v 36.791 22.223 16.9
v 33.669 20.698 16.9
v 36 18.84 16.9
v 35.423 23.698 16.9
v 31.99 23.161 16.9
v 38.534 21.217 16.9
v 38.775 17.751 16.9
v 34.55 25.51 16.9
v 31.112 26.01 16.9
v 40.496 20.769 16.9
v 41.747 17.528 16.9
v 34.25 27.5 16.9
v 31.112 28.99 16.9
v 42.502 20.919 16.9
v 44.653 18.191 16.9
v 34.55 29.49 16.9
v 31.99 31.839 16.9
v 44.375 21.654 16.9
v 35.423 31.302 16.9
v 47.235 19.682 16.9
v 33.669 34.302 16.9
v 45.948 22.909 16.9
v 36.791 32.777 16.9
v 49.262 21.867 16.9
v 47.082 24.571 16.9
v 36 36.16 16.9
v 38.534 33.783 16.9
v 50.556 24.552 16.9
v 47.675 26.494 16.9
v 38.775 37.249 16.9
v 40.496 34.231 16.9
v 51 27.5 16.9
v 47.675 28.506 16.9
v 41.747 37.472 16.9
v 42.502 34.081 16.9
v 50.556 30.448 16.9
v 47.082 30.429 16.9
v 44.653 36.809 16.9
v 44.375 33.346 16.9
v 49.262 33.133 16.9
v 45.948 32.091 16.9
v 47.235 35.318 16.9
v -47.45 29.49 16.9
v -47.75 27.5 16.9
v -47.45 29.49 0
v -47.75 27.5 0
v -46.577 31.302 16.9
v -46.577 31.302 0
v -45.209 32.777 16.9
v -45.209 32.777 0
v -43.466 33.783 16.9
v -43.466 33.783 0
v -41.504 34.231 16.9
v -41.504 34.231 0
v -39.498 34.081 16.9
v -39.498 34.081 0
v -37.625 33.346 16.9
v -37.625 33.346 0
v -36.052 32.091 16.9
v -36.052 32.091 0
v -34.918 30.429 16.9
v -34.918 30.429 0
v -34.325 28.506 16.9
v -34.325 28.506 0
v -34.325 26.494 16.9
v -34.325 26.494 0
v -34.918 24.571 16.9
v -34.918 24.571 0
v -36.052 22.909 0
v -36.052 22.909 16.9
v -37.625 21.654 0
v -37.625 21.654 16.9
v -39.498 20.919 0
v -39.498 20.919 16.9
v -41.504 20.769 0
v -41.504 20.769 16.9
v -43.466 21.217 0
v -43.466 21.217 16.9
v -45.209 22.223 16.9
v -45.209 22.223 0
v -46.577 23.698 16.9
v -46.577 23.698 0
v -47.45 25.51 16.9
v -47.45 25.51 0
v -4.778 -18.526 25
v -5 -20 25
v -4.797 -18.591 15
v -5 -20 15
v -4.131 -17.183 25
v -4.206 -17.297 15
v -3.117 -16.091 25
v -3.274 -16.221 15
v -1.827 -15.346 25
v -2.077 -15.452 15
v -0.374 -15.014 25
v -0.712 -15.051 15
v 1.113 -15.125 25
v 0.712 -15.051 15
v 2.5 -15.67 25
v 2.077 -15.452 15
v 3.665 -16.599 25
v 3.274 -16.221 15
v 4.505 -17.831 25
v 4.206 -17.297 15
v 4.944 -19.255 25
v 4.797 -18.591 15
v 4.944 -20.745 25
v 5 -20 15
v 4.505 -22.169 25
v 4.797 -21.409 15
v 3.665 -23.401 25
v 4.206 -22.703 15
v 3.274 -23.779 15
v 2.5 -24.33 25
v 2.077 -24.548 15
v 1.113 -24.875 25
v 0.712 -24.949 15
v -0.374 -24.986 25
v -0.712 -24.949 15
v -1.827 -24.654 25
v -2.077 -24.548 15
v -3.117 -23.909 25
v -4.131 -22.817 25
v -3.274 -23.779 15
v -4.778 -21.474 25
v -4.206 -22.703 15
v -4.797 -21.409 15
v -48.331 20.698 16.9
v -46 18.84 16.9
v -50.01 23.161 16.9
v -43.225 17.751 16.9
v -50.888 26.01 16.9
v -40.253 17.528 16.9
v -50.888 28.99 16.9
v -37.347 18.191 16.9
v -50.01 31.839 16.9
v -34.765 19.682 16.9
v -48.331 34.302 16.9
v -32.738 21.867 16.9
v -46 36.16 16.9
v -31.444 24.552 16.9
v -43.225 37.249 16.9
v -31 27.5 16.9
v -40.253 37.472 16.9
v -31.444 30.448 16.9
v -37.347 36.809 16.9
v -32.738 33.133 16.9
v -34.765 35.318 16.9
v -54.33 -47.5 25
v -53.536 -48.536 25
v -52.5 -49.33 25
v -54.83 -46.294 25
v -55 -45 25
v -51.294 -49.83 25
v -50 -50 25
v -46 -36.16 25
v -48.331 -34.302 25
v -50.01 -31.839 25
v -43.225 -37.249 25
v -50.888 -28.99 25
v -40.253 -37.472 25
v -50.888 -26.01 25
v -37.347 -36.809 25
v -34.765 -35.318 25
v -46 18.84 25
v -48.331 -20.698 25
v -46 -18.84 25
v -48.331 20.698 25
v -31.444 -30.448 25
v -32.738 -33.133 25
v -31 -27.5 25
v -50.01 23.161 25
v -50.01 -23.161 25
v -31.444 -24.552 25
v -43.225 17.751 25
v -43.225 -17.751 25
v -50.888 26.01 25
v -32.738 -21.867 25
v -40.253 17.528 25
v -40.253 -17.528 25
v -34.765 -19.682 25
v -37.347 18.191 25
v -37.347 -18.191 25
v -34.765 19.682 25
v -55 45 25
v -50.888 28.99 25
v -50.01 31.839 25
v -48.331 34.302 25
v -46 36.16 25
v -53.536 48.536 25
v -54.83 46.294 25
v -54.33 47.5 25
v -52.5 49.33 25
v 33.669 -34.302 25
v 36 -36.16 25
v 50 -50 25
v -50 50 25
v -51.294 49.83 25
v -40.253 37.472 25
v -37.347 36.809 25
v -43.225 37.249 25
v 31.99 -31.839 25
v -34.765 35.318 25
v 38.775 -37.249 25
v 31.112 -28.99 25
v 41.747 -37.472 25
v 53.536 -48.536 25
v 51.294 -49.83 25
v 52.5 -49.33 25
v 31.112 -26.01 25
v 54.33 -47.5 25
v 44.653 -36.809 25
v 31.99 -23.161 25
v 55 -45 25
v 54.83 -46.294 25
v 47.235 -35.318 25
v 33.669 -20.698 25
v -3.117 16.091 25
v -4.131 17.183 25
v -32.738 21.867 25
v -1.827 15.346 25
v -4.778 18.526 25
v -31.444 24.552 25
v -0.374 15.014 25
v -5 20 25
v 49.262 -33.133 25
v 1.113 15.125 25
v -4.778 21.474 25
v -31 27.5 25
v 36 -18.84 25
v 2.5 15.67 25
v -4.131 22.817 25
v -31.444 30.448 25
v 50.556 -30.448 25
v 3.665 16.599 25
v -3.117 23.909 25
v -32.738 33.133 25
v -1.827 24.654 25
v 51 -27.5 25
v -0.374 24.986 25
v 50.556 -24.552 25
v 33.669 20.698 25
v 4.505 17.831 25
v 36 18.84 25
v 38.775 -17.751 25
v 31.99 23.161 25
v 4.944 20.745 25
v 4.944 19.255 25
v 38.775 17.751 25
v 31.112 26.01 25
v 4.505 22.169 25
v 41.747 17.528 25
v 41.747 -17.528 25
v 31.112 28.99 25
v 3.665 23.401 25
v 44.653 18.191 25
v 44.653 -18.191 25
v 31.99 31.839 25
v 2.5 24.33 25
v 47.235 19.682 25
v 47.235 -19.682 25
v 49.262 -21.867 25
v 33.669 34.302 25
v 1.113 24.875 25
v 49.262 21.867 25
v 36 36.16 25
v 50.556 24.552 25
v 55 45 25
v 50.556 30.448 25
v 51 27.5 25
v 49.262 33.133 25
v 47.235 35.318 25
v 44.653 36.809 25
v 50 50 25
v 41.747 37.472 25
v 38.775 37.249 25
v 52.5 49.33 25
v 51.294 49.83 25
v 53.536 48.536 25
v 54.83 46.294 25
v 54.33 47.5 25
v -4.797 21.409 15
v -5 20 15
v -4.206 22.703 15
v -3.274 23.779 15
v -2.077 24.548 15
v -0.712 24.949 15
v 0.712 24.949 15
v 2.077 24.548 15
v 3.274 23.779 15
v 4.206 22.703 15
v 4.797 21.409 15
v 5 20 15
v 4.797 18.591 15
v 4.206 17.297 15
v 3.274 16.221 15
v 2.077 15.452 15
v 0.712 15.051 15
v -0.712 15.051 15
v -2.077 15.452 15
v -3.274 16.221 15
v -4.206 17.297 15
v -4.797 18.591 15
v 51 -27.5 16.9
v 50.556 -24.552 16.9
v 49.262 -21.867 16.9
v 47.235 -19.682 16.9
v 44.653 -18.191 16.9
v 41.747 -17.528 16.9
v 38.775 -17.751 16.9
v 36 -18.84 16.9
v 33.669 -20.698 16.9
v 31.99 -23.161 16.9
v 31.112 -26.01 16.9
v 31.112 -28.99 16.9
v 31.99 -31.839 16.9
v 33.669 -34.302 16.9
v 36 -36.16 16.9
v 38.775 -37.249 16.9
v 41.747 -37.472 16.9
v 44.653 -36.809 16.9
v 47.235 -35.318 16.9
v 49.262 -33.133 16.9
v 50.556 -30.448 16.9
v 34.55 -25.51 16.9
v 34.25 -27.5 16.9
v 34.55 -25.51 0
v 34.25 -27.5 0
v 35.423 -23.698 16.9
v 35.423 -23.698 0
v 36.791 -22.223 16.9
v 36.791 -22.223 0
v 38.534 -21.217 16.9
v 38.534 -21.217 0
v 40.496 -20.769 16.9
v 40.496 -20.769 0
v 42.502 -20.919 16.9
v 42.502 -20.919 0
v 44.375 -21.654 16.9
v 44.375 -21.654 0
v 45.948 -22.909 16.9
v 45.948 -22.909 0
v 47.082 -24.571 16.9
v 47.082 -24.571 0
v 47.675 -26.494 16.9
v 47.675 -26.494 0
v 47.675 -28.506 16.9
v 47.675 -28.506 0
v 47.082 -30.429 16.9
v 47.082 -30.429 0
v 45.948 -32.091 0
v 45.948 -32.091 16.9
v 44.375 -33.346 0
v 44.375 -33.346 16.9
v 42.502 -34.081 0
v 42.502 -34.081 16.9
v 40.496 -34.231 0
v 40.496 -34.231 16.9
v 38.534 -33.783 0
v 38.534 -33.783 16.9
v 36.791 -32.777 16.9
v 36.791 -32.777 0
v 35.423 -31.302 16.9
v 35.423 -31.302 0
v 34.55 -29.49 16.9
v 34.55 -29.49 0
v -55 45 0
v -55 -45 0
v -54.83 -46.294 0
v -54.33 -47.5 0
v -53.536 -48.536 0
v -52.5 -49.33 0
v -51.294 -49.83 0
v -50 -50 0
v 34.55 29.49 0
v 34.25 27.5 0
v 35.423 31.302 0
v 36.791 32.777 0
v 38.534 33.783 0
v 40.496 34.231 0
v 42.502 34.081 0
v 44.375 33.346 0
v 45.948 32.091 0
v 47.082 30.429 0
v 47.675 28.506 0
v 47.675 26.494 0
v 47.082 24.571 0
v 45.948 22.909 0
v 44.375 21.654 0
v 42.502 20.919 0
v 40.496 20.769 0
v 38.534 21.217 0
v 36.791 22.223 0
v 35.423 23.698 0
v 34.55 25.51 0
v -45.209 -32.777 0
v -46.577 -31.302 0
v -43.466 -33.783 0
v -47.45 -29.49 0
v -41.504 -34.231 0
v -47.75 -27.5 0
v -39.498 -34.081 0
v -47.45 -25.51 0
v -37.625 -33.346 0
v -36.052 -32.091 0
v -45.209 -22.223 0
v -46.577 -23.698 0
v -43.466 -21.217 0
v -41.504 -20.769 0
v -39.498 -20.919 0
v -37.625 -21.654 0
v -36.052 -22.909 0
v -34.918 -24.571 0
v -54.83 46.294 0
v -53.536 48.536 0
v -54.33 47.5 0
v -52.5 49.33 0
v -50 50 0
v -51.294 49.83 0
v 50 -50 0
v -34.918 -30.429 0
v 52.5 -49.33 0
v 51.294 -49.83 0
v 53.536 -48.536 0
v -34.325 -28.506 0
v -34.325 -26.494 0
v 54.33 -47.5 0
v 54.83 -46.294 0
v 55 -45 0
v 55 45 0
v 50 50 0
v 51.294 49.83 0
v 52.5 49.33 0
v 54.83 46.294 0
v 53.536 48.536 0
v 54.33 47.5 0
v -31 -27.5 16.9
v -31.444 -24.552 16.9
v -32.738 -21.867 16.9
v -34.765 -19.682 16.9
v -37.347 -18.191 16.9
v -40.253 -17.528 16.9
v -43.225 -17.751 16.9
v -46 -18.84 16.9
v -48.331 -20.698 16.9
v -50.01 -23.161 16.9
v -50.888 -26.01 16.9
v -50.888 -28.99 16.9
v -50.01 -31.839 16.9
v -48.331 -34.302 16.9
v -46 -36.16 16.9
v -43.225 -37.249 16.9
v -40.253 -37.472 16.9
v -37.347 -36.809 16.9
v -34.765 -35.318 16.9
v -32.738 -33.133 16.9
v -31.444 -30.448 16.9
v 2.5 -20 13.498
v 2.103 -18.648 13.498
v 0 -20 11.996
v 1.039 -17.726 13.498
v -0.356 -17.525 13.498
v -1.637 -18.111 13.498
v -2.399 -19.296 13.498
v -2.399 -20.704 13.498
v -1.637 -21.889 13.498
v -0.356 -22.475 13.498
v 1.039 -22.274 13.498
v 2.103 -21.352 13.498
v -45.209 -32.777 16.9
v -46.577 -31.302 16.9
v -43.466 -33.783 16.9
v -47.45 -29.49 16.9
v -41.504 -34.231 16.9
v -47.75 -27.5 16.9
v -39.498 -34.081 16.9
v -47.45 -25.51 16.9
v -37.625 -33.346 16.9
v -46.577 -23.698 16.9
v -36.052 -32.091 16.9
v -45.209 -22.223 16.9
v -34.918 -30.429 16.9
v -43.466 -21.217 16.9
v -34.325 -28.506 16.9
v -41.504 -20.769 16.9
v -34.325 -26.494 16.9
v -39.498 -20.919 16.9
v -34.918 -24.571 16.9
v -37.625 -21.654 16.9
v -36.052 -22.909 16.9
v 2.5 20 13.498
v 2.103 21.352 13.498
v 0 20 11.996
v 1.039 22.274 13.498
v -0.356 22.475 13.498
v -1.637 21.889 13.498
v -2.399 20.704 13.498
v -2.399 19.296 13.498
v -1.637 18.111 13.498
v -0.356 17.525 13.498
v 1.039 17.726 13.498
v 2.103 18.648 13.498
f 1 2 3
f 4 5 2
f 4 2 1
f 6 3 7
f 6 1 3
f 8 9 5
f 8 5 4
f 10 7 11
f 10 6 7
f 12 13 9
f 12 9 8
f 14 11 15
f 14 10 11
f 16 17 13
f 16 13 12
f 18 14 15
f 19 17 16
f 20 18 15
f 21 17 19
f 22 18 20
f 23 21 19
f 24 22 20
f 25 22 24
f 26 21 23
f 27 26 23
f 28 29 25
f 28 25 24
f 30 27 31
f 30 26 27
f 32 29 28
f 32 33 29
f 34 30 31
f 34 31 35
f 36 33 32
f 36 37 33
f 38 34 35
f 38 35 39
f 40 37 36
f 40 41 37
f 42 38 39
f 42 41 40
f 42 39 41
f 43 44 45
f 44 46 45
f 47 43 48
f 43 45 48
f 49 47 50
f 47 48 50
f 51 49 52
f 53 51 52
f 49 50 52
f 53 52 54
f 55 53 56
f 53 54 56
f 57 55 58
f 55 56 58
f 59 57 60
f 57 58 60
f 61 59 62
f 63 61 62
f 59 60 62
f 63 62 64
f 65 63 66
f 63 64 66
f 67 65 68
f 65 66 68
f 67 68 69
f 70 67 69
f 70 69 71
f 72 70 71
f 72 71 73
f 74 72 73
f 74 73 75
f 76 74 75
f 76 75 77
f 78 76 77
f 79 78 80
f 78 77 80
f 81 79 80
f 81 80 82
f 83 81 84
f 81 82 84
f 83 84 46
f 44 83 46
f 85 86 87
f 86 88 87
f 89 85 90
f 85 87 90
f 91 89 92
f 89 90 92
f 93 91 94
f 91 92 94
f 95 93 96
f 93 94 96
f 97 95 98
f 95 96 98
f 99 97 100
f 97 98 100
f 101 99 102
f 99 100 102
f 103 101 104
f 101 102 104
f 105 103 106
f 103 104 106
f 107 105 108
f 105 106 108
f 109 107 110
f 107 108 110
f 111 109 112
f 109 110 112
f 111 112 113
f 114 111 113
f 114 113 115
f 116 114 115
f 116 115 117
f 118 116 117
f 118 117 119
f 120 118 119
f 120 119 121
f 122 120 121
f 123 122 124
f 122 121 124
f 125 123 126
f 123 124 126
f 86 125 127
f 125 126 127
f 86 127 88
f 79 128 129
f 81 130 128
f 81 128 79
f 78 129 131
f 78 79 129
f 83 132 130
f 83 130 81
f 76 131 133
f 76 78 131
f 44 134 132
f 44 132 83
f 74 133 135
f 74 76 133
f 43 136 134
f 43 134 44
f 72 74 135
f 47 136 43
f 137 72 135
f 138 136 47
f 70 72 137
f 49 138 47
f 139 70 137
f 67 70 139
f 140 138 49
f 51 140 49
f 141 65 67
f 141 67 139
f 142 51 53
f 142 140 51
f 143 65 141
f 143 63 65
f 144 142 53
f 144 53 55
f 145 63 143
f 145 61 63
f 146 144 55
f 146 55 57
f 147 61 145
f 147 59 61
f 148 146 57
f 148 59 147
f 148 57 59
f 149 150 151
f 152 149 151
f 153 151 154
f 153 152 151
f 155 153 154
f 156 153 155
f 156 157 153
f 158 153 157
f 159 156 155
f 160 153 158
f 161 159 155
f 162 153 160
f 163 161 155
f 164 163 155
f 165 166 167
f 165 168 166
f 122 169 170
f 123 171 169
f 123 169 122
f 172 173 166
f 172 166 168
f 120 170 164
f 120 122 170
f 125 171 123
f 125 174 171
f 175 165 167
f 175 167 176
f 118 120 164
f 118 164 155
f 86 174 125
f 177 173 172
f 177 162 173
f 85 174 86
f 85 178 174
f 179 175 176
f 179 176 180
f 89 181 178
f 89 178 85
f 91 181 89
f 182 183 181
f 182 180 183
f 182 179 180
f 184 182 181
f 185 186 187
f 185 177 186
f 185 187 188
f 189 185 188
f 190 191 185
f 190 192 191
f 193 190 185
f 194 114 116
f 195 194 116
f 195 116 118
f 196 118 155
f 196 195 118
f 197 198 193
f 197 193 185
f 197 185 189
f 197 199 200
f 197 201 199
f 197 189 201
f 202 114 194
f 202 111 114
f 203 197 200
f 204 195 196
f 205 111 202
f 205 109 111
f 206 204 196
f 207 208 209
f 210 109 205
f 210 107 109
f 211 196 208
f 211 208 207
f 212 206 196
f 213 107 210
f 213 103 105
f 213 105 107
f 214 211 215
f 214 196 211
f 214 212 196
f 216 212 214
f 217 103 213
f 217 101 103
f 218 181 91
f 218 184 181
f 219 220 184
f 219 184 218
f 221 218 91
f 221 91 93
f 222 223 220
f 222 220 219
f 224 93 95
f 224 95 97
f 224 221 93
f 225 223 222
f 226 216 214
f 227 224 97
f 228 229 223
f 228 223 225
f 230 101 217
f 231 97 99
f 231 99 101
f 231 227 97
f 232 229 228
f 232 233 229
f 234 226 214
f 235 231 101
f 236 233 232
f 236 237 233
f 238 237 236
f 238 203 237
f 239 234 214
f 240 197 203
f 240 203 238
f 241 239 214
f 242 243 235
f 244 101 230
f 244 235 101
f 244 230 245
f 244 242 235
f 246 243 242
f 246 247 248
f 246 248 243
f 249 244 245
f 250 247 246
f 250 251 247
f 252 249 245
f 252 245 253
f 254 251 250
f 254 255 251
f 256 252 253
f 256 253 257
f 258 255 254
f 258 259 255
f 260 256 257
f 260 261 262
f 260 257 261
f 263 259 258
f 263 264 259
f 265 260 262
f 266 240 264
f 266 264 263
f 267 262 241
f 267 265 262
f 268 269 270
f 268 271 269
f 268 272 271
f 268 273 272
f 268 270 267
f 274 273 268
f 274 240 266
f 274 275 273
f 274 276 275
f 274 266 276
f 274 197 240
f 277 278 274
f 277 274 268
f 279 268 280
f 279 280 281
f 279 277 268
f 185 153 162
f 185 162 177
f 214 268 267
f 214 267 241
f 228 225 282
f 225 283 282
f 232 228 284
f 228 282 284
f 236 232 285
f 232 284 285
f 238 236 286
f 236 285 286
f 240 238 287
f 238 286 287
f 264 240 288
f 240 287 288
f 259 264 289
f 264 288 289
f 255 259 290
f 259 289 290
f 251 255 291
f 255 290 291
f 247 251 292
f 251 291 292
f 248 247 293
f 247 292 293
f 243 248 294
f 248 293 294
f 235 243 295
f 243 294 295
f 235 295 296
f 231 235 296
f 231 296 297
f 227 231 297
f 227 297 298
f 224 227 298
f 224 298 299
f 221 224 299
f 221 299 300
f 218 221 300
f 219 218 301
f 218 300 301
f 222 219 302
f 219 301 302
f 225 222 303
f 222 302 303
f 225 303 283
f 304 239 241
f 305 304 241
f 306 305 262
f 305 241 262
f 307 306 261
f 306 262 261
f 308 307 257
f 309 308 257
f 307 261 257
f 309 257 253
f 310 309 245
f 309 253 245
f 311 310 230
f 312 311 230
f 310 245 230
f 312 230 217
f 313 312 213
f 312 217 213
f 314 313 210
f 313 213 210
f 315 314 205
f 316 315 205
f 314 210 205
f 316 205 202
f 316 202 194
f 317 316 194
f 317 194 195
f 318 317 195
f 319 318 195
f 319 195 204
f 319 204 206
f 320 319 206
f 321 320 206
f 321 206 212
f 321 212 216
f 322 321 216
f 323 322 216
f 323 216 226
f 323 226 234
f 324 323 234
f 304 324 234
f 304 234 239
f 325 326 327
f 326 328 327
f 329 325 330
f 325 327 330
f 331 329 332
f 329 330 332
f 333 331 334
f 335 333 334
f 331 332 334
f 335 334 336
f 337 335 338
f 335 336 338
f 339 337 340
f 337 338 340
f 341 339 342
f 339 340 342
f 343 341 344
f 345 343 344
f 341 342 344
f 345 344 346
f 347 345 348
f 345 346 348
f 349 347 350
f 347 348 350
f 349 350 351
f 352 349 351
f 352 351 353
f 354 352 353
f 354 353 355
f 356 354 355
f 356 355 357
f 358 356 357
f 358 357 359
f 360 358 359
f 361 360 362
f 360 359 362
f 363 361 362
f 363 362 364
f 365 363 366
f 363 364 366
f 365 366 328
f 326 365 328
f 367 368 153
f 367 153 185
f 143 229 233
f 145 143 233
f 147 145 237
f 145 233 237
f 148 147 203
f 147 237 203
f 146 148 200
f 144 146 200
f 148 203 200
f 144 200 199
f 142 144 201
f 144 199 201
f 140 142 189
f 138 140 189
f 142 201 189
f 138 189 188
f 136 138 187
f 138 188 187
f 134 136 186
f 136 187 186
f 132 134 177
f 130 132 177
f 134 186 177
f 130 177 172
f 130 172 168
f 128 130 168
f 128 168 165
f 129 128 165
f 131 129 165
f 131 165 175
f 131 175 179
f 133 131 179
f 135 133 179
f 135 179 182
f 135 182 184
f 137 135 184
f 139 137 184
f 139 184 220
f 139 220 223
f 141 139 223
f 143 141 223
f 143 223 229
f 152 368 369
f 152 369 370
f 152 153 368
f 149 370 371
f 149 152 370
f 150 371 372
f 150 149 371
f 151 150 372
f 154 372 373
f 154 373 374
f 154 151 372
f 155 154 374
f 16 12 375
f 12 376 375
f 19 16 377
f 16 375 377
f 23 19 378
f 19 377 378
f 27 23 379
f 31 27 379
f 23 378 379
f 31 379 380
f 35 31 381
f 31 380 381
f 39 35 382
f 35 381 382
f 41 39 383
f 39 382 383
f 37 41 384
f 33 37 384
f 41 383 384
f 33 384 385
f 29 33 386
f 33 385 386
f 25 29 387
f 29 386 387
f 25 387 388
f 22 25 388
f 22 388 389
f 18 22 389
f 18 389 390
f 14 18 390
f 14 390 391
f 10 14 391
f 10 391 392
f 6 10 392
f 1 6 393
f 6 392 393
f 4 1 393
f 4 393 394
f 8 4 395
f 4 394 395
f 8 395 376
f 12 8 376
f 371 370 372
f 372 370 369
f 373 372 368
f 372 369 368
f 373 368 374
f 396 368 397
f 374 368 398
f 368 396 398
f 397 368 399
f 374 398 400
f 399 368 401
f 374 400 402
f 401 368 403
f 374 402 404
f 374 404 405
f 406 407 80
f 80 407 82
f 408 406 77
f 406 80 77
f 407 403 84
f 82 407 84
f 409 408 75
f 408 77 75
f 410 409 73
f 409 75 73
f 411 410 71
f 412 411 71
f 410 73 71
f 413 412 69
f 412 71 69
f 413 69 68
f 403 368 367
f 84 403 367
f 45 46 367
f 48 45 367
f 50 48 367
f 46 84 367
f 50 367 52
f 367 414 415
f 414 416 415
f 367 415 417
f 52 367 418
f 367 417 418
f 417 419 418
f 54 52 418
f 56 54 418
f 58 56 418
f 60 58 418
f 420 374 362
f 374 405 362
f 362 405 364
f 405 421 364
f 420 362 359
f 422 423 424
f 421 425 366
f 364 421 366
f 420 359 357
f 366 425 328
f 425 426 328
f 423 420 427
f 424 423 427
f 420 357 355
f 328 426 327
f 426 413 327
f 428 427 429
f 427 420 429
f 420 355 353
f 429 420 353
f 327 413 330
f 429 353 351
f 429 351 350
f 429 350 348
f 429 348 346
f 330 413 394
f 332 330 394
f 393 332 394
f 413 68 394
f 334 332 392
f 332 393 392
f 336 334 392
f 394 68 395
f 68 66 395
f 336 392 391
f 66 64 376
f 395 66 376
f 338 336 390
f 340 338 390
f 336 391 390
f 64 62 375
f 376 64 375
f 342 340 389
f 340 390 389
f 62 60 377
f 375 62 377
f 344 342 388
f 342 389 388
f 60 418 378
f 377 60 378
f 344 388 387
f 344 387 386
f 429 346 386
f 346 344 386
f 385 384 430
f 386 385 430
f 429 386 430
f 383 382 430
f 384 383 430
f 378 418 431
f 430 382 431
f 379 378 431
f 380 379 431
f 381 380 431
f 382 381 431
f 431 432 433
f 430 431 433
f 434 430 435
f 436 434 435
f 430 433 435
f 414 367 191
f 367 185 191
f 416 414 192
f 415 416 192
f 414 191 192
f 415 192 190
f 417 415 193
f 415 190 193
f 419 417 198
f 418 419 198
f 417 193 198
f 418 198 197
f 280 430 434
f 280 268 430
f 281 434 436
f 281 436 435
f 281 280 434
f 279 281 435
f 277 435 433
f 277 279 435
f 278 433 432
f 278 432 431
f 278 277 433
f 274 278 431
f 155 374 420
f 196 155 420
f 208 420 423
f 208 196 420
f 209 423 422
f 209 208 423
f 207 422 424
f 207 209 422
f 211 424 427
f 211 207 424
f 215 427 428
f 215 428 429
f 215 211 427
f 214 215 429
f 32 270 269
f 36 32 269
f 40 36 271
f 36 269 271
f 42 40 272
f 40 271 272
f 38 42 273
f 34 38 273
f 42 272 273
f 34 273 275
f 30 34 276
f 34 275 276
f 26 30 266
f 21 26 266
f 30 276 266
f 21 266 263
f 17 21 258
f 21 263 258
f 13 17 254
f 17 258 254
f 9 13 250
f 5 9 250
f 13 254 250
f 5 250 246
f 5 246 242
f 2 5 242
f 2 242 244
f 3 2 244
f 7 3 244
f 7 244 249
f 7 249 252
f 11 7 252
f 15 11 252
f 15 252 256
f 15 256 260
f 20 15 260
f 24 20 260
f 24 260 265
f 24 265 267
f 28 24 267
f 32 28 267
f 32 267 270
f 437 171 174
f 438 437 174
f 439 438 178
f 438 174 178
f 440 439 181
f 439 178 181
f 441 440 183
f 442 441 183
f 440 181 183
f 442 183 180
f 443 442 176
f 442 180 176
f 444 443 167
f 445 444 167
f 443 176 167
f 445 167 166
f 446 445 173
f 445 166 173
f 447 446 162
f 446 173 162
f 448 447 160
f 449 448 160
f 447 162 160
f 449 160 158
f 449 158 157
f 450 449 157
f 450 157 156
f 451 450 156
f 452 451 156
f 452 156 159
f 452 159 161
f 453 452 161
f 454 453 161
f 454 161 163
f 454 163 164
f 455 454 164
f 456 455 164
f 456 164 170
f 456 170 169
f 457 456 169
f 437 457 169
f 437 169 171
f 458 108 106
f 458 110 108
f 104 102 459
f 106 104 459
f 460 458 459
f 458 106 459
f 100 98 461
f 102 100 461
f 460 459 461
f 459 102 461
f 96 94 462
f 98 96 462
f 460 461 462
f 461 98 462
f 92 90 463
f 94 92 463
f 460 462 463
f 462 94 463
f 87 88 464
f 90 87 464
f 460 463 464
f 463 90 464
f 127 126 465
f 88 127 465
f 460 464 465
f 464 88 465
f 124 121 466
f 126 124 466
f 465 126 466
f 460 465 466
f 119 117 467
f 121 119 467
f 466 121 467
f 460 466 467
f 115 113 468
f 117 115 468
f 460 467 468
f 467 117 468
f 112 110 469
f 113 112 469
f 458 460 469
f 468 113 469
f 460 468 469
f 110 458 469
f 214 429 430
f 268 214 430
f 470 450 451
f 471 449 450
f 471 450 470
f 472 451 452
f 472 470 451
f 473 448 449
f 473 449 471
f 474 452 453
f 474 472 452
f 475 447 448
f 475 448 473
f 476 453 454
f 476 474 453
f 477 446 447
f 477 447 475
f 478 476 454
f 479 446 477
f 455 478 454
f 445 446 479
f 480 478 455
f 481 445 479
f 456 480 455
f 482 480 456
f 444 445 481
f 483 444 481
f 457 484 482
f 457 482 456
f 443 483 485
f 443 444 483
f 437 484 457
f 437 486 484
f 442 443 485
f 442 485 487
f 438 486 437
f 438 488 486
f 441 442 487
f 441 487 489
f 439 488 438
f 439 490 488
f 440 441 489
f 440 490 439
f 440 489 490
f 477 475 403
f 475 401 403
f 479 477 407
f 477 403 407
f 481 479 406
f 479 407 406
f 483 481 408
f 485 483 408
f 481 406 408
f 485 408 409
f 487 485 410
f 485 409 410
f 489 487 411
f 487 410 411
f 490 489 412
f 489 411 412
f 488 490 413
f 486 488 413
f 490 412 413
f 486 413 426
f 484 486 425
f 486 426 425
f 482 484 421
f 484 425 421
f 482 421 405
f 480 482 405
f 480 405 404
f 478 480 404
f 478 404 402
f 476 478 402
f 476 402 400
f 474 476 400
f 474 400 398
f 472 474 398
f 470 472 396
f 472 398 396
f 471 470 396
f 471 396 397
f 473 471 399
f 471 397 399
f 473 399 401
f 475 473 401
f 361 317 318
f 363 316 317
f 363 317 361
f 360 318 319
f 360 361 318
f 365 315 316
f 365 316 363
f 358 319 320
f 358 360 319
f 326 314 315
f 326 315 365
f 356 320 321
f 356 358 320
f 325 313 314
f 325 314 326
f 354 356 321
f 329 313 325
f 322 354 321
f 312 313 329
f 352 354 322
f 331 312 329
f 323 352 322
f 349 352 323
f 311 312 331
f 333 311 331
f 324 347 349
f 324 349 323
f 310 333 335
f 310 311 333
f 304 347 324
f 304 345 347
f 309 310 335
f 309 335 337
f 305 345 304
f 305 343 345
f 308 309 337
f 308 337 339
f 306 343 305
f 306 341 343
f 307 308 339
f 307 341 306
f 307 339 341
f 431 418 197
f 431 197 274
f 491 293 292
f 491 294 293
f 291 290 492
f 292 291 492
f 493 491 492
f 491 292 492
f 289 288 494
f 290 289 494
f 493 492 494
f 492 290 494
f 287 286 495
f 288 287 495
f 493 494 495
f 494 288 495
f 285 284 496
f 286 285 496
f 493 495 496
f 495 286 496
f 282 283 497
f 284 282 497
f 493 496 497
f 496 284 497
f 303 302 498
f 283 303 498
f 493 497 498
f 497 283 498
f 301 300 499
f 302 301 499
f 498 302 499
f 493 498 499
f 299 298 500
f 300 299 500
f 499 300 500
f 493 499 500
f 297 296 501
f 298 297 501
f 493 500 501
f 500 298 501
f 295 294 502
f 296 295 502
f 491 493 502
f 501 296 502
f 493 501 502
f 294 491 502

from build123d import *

# Parameters (mm, degrees)
SKIZZE1_W                                            = 110
SKIZZE1_H                                            = 100
AUFSATZ_LINEAR_AUSTRAGEN1_DEPTH                      = 25
VERRUNDUNG1_R                                        = 5
STIRNSENKUNG_F_R_M12_ZYLINDERSCHRAUBE_MI_D           = 13.5
STIRNSENKUNG_F_R_M12_ZYLINDERSCHRAUBE_MI_CBORE_D     = 20
STIRNSENKUNG_F_R_M12_ZYLINDERSCHRAUBE_MI_CBORE_DEPTH = 8.1
F_10_0MM_STIFTLOCH1_D                                = 10
F_10_0MM_STIFTLOCH1_DEPTH                            = 10
F_10_0MM_STIFTLOCH1_TIP                              = 3.004303095


with BuildPart() as part:
    # Skizze1 → Aufsatz-Linear austragen1 (new body)
    with BuildSketch(Plane.XY):
        Rectangle(SKIZZE1_W, SKIZZE1_H)
    extrude(amount=AUFSATZ_LINEAR_AUSTRAGEN1_DEPTH)

    # Verrundung1
    verrundung1_edges = [part.edges().sort_by_distance(p)[0] for p in [
        (55, -50, 12.5),
        (-55, -50, 12.5),
        (-55, 50, 12.5),
        (55, 50, 12.5),
    ]]
    fillet(verrundung1_edges, radius=VERRUNDUNG1_R)

    # Stirnsenkung für M12 Zylinderschraube mit Innensechskant1 (through all)
    with Locations(Plane.XY.offset(25)):
        with Locations((-41, 27.5), (41, 27.5), (41, -27.5), (-41, -27.5)):
            CounterBoreHole(STIRNSENKUNG_F_R_M12_ZYLINDERSCHRAUBE_MI_D / 2, STIRNSENKUNG_F_R_M12_ZYLINDERSCHRAUBE_MI_CBORE_D / 2, STIRNSENKUNG_F_R_M12_ZYLINDERSCHRAUBE_MI_CBORE_DEPTH)

    # Ø10.0mm Stiftloch1
    with Locations(Plane.XY.offset(25)):
        with Locations((0, 20), (0, -20)):
            Hole(F_10_0MM_STIFTLOCH1_D / 2, depth=F_10_0MM_STIFTLOCH1_DEPTH)
            with Locations((0, 0, -(F_10_0MM_STIFTLOCH1_DEPTH + F_10_0MM_STIFTLOCH1_TIP / 2))):  # 118° drill point
                Cone(0, F_10_0MM_STIFTLOCH1_D / 2, F_10_0MM_STIFTLOCH1_TIP, mode=Mode.SUBTRACT)


solid = part.part
